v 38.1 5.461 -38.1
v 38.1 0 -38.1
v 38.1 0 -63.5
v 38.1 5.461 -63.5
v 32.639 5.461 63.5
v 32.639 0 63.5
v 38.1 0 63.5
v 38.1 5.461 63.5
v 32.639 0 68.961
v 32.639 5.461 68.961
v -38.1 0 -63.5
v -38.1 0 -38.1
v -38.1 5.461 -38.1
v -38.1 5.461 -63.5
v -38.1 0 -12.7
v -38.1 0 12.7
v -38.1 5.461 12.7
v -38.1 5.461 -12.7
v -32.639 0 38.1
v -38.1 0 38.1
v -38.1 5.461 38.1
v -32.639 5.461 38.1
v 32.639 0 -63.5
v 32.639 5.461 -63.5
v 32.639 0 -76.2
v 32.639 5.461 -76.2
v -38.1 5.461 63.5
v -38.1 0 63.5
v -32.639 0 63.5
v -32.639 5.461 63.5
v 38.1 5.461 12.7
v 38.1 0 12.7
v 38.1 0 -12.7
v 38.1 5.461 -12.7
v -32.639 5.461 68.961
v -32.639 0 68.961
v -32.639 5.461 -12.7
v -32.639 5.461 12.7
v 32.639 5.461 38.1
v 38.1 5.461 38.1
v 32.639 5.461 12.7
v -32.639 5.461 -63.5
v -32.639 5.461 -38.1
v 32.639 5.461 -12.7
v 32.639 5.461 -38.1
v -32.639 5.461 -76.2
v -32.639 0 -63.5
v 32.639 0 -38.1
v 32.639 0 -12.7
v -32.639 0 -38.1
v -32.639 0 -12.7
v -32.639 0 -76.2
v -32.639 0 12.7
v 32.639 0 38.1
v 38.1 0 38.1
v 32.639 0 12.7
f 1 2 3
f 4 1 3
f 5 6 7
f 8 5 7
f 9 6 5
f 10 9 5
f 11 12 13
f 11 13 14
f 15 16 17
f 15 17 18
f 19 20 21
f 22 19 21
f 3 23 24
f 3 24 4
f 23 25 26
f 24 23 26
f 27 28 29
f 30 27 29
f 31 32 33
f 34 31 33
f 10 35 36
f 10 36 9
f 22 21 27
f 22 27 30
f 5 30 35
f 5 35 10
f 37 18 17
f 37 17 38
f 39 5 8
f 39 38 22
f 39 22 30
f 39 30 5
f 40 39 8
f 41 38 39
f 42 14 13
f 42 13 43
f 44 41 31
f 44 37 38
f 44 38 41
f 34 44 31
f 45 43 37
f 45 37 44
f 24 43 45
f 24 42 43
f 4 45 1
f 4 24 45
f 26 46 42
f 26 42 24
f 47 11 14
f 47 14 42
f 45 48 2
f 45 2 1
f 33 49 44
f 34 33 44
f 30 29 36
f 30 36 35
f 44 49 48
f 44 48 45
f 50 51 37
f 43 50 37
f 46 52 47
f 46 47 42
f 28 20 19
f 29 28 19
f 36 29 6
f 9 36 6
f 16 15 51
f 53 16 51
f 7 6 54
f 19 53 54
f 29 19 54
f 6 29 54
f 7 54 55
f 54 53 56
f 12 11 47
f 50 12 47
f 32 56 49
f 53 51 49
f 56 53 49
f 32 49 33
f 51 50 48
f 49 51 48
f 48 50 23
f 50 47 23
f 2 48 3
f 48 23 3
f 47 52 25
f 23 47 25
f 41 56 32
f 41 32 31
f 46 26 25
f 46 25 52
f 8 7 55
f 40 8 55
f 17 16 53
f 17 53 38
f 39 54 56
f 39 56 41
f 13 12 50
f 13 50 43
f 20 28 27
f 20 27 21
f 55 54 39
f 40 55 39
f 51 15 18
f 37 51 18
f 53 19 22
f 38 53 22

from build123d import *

# Parameters (mm, degrees)
SKETCH1_W           = 76.2
SKETCH1_H           = 127
BOSS_EXTRUDE1_DEPTH = 5.461
CAVITY1_START       = -38.1
CAVITY1_OUTLINE_W   = 5.461
CAVITY1_OUTLINE_H   = 25.4
CAVITY1_DEPTH       = 5.461
CAVITY1_START_2     = 32.639
CAVITY1_2_OUTLINE_W = 5.461
CAVITY1_2_OUTLINE_H = 25.4
CAVITY1_2_DEPTH     = 5.461
SKETCH2_W           = 65.278
SKETCH2_H           = 5.461
BOSS_EXTRUDE2_DEPTH = 5.461
SKETCH3_W           = 65.278
SKETCH3_H           = 5.461
BOSS_EXTRUDE3_DEPTH = 12.7


# Read off the part's stored shape, not the designer's step: Cavity1
with BuildPart() as part:
    # Sketch1 → Boss-Extrude1 (new body)
    with BuildSketch(Plane(origin=(0, 0, 0), x_dir=(1, 0, 0), z_dir=(0, 1, 0))):
        Rectangle(SKETCH1_W, SKETCH1_H)
    extrude(amount=BOSS_EXTRUDE1_DEPTH)

    # Cavity1 outline → Cavity1 (cut)
    with BuildSketch(Plane.YZ.offset(CAVITY1_START)):
        with Locations((2.7305, 25.4)):
            Rectangle(CAVITY1_OUTLINE_W, CAVITY1_OUTLINE_H)
        with Locations((2.7305, -25.4)):
            Rectangle(CAVITY1_OUTLINE_W, CAVITY1_OUTLINE_H)
    extrude(amount=CAVITY1_DEPTH, mode=Mode.SUBTRACT)

    # Cavity1 2 outline → Cavity1 2 (cut)
    with BuildSketch(Plane.YZ.offset(CAVITY1_START_2)):
        with Locations((2.7305, 25.4)):
            Rectangle(CAVITY1_2_OUTLINE_W, CAVITY1_2_OUTLINE_H)
        with Locations((2.7305, -25.4)):
            Rectangle(CAVITY1_2_OUTLINE_W, CAVITY1_2_OUTLINE_H)
    extrude(amount=CAVITY1_2_DEPTH, mode=Mode.SUBTRACT)

    # Sketch2 → Boss-Extrude2 (add)
    with BuildSketch(Plane.XY.offset(63.5)):
        with Locations((0, 2.7305)):
            Rectangle(SKETCH2_W, SKETCH2_H)
    extrude(amount=BOSS_EXTRUDE2_DEPTH)

    # Sketch3 → Boss-Extrude3 (add)
    with BuildSketch(Plane(origin=(0, 0, -63.5), x_dir=(-1, 0, 0), z_dir=(0, 0, -1))):
        with Locations((0, 2.7305)):
            Rectangle(SKETCH3_W, SKETCH3_H)
    extrude(amount=BOSS_EXTRUDE3_DEPTH)


solid = part.part
